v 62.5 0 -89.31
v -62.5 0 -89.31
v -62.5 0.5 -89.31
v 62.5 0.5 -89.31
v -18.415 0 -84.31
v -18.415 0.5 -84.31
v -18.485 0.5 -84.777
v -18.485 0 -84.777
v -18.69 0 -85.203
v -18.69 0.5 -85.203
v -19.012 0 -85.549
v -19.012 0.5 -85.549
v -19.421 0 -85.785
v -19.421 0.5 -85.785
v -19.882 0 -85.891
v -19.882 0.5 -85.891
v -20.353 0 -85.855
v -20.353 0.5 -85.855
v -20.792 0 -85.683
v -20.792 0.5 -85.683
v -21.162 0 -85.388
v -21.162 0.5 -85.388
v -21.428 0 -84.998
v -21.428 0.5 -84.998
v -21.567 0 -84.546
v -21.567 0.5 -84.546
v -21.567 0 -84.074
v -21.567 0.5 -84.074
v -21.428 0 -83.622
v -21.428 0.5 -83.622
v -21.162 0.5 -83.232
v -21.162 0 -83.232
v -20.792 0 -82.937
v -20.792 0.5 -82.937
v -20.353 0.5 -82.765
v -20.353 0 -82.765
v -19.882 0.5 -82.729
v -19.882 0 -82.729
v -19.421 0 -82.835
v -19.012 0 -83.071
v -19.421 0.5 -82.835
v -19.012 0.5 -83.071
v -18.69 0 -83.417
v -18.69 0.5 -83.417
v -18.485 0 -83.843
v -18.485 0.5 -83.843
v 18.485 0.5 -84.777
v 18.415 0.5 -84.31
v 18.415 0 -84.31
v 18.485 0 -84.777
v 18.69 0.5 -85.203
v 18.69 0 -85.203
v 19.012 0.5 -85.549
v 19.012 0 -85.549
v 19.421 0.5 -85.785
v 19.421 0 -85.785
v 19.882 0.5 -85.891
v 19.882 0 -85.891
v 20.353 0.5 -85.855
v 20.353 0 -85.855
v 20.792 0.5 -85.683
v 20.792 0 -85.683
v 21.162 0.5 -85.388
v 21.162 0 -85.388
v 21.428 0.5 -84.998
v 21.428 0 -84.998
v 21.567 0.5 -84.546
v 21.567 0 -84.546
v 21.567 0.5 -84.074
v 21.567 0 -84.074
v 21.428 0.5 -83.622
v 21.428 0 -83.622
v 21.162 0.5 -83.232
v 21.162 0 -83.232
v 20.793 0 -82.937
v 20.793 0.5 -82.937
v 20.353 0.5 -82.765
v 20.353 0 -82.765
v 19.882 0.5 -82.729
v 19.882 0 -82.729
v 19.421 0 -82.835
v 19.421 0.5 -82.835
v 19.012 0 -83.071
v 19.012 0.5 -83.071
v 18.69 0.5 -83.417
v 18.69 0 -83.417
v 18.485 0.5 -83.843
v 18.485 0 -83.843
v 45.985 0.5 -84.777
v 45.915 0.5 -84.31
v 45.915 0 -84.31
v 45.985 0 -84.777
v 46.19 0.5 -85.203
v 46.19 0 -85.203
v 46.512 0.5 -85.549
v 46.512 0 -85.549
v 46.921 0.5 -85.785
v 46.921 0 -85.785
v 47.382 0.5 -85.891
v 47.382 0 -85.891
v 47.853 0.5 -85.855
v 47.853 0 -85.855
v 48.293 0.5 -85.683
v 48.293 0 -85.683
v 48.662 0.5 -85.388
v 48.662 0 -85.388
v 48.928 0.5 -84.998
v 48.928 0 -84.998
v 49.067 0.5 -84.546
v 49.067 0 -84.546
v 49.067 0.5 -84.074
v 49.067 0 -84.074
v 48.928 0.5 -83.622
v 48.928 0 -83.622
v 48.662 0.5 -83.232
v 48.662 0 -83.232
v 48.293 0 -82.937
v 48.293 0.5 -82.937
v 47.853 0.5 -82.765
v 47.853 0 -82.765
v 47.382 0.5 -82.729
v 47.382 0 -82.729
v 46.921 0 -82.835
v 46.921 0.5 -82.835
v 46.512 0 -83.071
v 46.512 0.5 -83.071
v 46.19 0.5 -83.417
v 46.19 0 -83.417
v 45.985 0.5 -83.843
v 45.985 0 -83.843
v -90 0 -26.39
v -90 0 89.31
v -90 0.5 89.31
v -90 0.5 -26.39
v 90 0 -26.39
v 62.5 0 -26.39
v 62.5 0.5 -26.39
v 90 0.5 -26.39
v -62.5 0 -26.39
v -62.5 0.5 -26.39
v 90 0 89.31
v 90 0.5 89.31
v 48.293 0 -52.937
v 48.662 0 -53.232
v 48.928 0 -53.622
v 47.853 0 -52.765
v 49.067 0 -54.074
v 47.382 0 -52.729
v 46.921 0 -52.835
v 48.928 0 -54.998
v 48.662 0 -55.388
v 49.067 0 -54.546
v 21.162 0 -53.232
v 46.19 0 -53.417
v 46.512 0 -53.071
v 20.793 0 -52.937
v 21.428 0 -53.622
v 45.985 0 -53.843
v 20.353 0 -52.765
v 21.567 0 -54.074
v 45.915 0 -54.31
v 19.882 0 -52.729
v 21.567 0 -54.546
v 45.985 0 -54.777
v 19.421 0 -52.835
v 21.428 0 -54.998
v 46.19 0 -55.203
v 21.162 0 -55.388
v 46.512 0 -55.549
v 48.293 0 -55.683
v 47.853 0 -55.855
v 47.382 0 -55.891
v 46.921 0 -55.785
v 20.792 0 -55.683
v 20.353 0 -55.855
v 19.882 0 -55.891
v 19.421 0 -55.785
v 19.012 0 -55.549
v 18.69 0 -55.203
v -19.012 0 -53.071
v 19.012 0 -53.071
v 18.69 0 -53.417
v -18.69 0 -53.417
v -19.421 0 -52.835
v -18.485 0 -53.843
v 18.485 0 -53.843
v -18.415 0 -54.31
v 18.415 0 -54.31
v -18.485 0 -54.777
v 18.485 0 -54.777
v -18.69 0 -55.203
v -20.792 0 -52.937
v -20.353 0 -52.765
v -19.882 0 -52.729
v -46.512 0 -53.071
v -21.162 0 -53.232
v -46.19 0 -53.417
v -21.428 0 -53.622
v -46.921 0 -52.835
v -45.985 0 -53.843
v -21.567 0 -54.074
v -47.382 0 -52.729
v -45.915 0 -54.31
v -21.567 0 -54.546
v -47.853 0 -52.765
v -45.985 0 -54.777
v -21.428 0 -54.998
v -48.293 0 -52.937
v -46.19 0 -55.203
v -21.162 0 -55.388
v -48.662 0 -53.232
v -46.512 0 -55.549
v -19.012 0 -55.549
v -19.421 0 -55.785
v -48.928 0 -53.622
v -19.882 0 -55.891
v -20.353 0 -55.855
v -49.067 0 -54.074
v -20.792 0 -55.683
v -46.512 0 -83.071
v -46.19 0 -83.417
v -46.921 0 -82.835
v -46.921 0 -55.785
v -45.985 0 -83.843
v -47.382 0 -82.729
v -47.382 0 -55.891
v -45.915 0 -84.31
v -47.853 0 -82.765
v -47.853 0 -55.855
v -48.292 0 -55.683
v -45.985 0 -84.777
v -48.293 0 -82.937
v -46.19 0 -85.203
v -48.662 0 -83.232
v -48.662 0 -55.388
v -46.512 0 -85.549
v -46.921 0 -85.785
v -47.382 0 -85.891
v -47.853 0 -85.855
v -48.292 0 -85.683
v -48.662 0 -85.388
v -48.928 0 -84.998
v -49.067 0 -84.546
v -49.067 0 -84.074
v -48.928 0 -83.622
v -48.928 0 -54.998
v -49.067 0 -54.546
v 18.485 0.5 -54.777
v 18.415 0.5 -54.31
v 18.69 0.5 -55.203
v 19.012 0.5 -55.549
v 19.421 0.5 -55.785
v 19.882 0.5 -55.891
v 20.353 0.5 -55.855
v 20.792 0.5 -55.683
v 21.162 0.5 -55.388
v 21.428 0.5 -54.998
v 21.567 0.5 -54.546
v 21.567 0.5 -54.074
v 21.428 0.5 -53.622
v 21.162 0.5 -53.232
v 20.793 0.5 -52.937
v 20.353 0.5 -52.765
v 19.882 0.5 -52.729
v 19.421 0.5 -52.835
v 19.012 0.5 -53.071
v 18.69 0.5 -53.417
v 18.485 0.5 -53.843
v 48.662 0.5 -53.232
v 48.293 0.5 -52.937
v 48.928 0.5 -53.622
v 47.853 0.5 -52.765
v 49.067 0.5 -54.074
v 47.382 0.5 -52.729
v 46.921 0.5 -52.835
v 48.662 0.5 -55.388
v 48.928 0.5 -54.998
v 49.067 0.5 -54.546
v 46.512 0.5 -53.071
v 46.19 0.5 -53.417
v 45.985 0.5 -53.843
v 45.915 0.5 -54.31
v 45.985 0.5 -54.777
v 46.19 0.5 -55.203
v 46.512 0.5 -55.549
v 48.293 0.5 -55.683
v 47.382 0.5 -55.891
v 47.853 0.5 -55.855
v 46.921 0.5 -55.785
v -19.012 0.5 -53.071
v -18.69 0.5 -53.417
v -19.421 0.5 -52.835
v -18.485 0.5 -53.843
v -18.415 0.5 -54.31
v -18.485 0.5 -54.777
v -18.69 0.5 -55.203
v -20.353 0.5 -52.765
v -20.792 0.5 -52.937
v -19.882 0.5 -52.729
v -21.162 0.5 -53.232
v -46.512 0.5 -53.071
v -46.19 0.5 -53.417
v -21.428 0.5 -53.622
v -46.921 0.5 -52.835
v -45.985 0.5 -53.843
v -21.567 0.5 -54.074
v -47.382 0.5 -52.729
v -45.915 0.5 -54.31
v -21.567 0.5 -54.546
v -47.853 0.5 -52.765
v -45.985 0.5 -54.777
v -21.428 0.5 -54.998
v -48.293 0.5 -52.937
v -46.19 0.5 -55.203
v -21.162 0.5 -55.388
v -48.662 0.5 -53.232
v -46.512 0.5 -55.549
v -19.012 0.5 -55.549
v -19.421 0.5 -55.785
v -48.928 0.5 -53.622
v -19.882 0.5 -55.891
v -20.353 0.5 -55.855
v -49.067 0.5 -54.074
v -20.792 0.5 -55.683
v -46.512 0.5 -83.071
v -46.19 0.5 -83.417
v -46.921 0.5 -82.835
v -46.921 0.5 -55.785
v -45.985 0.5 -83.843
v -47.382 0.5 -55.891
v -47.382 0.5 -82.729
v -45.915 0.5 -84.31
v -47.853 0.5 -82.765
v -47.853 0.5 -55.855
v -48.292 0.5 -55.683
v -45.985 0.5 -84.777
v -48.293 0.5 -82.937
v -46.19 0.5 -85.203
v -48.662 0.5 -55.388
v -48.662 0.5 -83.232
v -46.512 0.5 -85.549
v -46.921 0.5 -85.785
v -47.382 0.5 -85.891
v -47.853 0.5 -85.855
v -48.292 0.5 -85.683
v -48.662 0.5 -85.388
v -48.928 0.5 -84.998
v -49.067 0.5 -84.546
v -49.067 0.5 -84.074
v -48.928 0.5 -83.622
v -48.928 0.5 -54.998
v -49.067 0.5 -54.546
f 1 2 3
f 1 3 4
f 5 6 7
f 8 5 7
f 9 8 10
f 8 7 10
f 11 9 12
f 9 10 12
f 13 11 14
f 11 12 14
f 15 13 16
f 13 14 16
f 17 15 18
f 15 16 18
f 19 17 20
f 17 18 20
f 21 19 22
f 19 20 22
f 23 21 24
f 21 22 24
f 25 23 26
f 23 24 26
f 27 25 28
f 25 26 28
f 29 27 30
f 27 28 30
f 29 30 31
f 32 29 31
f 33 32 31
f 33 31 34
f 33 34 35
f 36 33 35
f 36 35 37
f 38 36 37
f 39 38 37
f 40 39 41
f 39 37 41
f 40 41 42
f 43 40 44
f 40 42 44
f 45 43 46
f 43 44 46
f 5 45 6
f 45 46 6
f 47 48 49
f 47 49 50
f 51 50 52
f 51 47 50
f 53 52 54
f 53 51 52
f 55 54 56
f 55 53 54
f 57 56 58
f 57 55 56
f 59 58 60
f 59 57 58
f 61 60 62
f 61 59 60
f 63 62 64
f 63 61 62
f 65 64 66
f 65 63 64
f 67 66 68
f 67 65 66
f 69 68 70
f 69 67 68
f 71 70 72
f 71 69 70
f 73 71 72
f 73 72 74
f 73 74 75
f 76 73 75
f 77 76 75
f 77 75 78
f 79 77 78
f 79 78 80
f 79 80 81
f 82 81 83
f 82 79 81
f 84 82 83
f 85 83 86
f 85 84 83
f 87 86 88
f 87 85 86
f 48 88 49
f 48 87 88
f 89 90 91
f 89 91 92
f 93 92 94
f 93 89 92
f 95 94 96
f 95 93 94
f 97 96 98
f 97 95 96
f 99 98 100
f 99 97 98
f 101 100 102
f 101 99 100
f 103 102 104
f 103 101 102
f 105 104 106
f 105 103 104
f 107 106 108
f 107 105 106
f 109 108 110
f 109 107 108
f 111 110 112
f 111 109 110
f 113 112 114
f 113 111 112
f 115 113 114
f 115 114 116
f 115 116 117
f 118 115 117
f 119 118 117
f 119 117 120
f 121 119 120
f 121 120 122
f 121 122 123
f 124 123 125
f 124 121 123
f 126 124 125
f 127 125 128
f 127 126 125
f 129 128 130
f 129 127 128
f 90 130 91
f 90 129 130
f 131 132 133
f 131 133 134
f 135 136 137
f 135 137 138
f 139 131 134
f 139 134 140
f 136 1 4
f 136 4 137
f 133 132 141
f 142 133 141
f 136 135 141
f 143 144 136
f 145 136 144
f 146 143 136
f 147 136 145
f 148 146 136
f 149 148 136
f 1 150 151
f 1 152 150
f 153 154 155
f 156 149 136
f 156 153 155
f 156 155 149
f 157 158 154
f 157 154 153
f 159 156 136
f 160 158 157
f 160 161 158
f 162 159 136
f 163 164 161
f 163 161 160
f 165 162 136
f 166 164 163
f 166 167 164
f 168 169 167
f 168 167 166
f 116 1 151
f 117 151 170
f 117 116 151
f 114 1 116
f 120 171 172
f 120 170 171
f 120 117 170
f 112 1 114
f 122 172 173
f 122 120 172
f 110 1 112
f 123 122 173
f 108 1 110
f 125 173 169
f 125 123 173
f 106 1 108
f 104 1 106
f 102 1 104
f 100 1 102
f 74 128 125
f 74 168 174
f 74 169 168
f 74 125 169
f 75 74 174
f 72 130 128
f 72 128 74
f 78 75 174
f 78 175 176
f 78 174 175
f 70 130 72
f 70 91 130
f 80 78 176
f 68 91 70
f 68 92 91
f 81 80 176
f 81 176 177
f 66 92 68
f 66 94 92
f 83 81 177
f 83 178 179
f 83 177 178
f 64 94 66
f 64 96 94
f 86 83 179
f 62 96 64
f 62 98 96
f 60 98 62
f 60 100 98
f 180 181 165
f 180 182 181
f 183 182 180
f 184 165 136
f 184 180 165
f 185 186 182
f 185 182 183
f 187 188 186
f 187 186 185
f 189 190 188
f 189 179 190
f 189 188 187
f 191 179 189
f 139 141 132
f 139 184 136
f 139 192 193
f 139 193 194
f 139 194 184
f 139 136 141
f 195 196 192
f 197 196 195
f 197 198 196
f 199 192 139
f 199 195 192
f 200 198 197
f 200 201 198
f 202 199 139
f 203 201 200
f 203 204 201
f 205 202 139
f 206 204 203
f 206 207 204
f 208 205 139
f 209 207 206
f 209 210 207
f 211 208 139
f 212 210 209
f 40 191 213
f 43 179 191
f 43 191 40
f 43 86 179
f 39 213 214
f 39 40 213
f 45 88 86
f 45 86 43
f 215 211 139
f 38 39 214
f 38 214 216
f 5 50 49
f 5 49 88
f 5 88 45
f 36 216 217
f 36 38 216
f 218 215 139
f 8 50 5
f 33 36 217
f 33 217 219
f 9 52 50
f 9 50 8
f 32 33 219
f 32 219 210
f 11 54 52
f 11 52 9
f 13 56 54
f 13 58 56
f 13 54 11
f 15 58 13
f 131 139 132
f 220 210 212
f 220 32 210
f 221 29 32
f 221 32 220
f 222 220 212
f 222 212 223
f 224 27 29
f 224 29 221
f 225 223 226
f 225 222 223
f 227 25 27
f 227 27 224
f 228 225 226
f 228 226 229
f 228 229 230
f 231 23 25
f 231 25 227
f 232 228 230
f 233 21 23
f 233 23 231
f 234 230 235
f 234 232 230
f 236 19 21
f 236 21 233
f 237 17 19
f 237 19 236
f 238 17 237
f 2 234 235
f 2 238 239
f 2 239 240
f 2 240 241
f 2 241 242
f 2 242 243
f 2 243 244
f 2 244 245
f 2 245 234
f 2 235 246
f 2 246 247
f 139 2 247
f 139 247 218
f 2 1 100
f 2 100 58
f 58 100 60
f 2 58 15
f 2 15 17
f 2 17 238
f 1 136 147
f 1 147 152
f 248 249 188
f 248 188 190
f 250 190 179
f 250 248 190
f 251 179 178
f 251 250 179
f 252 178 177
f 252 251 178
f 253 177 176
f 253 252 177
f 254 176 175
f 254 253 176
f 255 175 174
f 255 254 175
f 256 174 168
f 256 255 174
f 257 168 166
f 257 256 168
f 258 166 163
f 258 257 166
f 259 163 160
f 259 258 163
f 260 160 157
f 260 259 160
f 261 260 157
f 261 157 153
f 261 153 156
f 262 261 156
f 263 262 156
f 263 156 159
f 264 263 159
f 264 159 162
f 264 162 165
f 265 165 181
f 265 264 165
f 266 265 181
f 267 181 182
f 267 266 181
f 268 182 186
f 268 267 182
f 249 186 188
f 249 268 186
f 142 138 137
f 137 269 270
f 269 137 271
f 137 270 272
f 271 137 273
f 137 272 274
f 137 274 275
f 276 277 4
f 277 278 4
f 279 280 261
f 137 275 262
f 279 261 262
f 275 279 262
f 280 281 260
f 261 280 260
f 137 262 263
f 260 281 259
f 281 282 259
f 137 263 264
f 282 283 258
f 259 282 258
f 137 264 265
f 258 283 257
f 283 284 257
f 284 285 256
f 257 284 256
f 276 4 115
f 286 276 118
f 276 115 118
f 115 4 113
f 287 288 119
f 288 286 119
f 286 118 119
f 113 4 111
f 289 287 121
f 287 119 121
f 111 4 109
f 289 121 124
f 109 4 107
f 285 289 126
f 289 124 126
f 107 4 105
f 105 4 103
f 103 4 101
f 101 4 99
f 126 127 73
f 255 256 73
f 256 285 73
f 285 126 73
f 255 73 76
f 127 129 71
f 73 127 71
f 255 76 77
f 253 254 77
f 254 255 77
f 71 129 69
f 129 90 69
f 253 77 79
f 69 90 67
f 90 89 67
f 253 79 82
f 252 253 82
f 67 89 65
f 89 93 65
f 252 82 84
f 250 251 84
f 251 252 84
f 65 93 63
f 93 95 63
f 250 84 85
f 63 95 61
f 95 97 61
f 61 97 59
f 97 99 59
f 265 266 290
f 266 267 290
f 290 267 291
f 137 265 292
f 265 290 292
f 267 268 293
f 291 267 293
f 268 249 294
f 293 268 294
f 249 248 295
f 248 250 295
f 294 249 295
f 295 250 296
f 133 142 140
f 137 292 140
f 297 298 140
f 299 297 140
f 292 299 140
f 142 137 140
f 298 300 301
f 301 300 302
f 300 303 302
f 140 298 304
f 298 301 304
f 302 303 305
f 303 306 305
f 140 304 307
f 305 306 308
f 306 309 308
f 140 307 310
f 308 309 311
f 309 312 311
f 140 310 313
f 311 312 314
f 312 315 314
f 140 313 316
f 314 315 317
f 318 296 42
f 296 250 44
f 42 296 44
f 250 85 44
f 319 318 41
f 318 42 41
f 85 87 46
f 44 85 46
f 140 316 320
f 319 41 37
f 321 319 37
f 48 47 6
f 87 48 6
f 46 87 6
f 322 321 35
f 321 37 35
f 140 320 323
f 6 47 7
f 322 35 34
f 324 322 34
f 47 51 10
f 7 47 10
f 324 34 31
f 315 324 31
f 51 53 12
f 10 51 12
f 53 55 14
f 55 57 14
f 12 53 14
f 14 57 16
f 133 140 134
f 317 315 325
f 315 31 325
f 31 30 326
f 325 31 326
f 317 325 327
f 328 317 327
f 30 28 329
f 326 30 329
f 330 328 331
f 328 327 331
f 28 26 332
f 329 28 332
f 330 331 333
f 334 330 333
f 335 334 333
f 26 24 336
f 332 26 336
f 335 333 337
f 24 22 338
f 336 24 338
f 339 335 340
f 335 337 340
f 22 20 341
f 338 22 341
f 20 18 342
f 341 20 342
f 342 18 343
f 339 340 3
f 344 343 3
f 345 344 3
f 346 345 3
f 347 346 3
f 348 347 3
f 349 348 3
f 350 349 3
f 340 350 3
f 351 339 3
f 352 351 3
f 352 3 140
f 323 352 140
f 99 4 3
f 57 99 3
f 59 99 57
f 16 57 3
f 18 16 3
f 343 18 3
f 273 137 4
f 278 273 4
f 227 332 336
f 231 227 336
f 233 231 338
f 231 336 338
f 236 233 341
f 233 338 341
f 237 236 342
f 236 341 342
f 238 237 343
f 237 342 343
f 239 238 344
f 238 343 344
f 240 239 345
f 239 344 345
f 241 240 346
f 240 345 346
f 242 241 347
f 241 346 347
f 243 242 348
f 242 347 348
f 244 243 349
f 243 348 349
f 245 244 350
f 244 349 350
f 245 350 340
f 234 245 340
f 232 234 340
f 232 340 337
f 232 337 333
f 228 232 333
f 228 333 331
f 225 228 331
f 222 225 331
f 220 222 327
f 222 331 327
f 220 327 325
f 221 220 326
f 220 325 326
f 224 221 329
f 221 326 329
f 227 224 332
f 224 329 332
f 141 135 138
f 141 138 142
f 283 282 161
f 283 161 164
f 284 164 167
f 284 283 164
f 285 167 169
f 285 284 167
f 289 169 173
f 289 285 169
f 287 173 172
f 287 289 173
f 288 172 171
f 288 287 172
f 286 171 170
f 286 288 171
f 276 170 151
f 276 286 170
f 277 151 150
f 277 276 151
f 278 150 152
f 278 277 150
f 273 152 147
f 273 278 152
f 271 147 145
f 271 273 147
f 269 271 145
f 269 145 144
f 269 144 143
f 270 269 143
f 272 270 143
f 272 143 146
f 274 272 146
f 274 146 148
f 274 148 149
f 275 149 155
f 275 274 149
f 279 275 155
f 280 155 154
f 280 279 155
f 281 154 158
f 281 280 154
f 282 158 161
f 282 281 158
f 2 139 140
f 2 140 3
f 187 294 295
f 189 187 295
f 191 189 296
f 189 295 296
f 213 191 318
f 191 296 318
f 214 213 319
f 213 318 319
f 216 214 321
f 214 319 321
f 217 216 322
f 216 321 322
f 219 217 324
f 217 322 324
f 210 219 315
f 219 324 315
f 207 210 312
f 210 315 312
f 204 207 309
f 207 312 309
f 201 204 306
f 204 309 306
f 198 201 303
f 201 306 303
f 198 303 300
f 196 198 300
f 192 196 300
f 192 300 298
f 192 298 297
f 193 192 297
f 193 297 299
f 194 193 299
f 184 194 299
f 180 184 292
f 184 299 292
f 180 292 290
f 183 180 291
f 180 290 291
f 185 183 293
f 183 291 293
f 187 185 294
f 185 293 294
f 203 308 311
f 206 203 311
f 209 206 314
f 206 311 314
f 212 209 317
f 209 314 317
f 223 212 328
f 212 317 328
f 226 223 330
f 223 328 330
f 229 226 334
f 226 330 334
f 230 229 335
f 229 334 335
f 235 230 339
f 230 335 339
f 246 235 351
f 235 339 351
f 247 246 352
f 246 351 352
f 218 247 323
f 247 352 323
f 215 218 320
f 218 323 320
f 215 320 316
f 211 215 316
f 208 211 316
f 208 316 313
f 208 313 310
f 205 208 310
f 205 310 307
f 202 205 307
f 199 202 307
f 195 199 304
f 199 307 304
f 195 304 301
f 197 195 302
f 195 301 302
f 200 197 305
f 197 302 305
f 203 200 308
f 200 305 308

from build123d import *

# Parameters (mm, degrees)
SALIENTE_EXTRUIR1_DEPTH = 0.5
CORTAR_EXTRUIR1_REACH   = 182
CROQUIS5_R              = 1.585
CORTAR_EXTRUIR3_DEPTH   = 0.5
CORTAR_EXTRUIR4_REACH   = 2.5
CROQUIS6_R              = 1.585
CORTAR_EXTRUIR5_REACH   = 2.5
CROQUIS7_R              = 1.585
CROQUIS8_R              = 1.585
CORTAR_EXTRUIR6_DEPTH   = 0.5


with BuildPart() as part:
    # Croquis2 → Saliente-Extruir1 (new body)
    with BuildSketch(Plane(origin=(0, 0, 0), x_dir=(1, 0, 0), z_dir=(0, 1, 0))):
        Polygon((-90, 26.39), (-62.5, 26.39), (-62.5, 89.31), (62.5, 89.31), (62.5, 26.39), (90, 26.39), (90, -89.31), (-90, -89.31), align=None)
    saliente_extruir1 = extrude(amount=SALIENTE_EXTRUIR1_DEPTH)

    # Croquis3 → Cortar-Extruir1 (cut, up to next)
    with BuildSketch(Plane(origin=(90, 0, 0), x_dir=(0, 0, -1), z_dir=(1, 0, 0)), mode=Mode.PRIVATE) as cortar_extruir1_sk1:
        Polygon((-89.31, 0), (-87.93626129, 0.5), (-89.31, 0.5), align=None)
    cortar_extruir1_tool1 = extrude(cortar_extruir1_sk1.sketch, amount=-CORTAR_EXTRUIR1_REACH, mode=Mode.PRIVATE) & part.part
    add(cortar_extruir1_tool1.solids().sort_by_distance((90, 0.333333, 88.852087))[0], mode=Mode.SUBTRACT)

    # Croquis5 → Cortar-Extruir3 (cut)
    with BuildSketch(Plane(origin=(0, 0.5, 0), x_dir=(1, 0, 0), z_dir=(0, 1, 0))):
        with Locations((74, -24.974980583)):
            Circle(CROQUIS5_R)
    cortar_extruir3 = extrude(amount=-CORTAR_EXTRUIR3_DEPTH, mode=Mode.SUBTRACT)

    # Simetría1: Cortar-Extruir3 across plane
    add(cortar_extruir3.mirror(Plane(origin=(0, 0, 0), x_dir=(0, 0, 1), z_dir=(1, 0, 0))), mode=Mode.SUBTRACT)

    # Croquis6 → Cortar-Extruir4 (cut, up to next)
    with BuildSketch(Plane(origin=(0, 0.5, 0), x_dir=(1, 0, 0), z_dir=(0, 1, 0)), mode=Mode.PRIVATE) as cortar_extruir4_sk1:
        with Locations((-56.5, 35.81)):
            Circle(CROQUIS6_R)
    cortar_extruir4_tool1 = extrude(cortar_extruir4_sk1.sketch, amount=-CORTAR_EXTRUIR4_REACH, mode=Mode.PRIVATE) & part.part
    add(cortar_extruir4_tool1.solids().sort_by_distance((-56.5, 0.5, -35.81))[0], mode=Mode.SUBTRACT)
    # Croquis6 → Cortar-Extruir4 (cut, up to next)
    with BuildSketch(Plane(origin=(0, 0.5, 0), x_dir=(1, 0, 0), z_dir=(0, 1, 0)), mode=Mode.PRIVATE) as cortar_extruir4_sk2:
        with Locations((-15.5, 35.81)):
            Circle(CROQUIS6_R)
    cortar_extruir4_tool2 = extrude(cortar_extruir4_sk2.sketch, amount=-CORTAR_EXTRUIR4_REACH, mode=Mode.PRIVATE) & part.part
    add(cortar_extruir4_tool2.solids().sort_by_distance((-15.5, 0.5, -35.81))[0], mode=Mode.SUBTRACT)
    # Croquis6 → Cortar-Extruir4 (cut, up to next)
    with BuildSketch(Plane(origin=(0, 0.5, 0), x_dir=(1, 0, 0), z_dir=(0, 1, 0)), mode=Mode.PRIVATE) as cortar_extruir4_sk3:
        with Locations((-15.5, 84.31)):
            Circle(CROQUIS6_R)
    cortar_extruir4_tool3 = extrude(cortar_extruir4_sk3.sketch, amount=-CORTAR_EXTRUIR4_REACH, mode=Mode.PRIVATE) & part.part
    add(cortar_extruir4_tool3.solids().sort_by_distance((-15.5, 0.5, -84.31))[0], mode=Mode.SUBTRACT)
    # Croquis6 → Cortar-Extruir4 (cut, up to next)
    with BuildSketch(Plane(origin=(0, 0.5, 0), x_dir=(1, 0, 0), z_dir=(0, 1, 0)), mode=Mode.PRIVATE) as cortar_extruir4_sk4:
        with Locations((-56.5, 84.31)):
            Circle(CROQUIS6_R)
    cortar_extruir4_tool4 = extrude(cortar_extruir4_sk4.sketch, amount=-CORTAR_EXTRUIR4_REACH, mode=Mode.PRIVATE) & part.part
    add(cortar_extruir4_tool4.solids().sort_by_distance((-56.5, 0.5, -84.31))[0], mode=Mode.SUBTRACT)

    # Croquis7 → Cortar-Extruir5 (cut, up to next)
    with BuildSketch(Plane(origin=(0, 0.5, 0), x_dir=(1, 0, 0), z_dir=(0, 1, 0)), mode=Mode.PRIVATE) as cortar_extruir5_sk1:
        with Locations((56.5, 35.81)):
            Circle(CROQUIS7_R)
    cortar_extruir5_tool1 = extrude(cortar_extruir5_sk1.sketch, amount=-CORTAR_EXTRUIR5_REACH, mode=Mode.PRIVATE) & part.part
    add(cortar_extruir5_tool1.solids().sort_by_distance((56.5, 0.5, -35.81))[0], mode=Mode.SUBTRACT)
    # Croquis7 → Cortar-Extruir5 (cut, up to next)
    with BuildSketch(Plane(origin=(0, 0.5, 0), x_dir=(1, 0, 0), z_dir=(0, 1, 0)), mode=Mode.PRIVATE) as cortar_extruir5_sk2:
        with Locations((15.5, 35.81)):
            Circle(CROQUIS7_R)
    cortar_extruir5_tool2 = extrude(cortar_extruir5_sk2.sketch, amount=-CORTAR_EXTRUIR5_REACH, mode=Mode.PRIVATE) & part.part
    add(cortar_extruir5_tool2.solids().sort_by_distance((15.5, 0.5, -35.81))[0], mode=Mode.SUBTRACT)
    # Croquis7 → Cortar-Extruir5 (cut, up to next)
    with BuildSketch(Plane(origin=(0, 0.5, 0), x_dir=(1, 0, 0), z_dir=(0, 1, 0)), mode=Mode.PRIVATE) as cortar_extruir5_sk3:
        with Locations((15.5, 84.31)):
            Circle(CROQUIS7_R)
    cortar_extruir5_tool3 = extrude(cortar_extruir5_sk3.sketch, amount=-CORTAR_EXTRUIR5_REACH, mode=Mode.PRIVATE) & part.part
    add(cortar_extruir5_tool3.solids().sort_by_distance((15.5, 0.5, -84.31))[0], mode=Mode.SUBTRACT)
    # Croquis7 → Cortar-Extruir5 (cut, up to next)
    with BuildSketch(Plane(origin=(0, 0.5, 0), x_dir=(1, 0, 0), z_dir=(0, 1, 0)), mode=Mode.PRIVATE) as cortar_extruir5_sk4:
        with Locations((56.5, 84.31)):
            Circle(CROQUIS7_R)
    cortar_extruir5_tool4 = extrude(cortar_extruir5_sk4.sketch, amount=-CORTAR_EXTRUIR5_REACH, mode=Mode.PRIVATE) & part.part
    add(cortar_extruir5_tool4.solids().sort_by_distance((56.5, 0.5, -84.31))[0], mode=Mode.SUBTRACT)

    # Simetría3: Saliente-Extruir1 across plane
    add(saliente_extruir1.mirror(Plane(origin=(0, 0, 0), x_dir=(0, 0, 1), z_dir=(1, 0, 0))))

    # Croquis8 → Cortar-Extruir6 (cut)
    with BuildSketch(Plane(origin=(0, 0.5, 0), x_dir=(1, 0, 0), z_dir=(0, 1, 0))):
        with Locations((-20, 54.31)):
            Circle(CROQUIS8_R)
        with Locations((-47.5, 54.31)):
            Circle(CROQUIS8_R)
        with Locations((-47.5, 84.31)):
            Circle(CROQUIS8_R)
        with Locations((-20, 84.31)):
            Circle(CROQUIS8_R)
    cortar_extruir6 = extrude(amount=-CORTAR_EXTRUIR6_DEPTH, mode=Mode.SUBTRACT)

    # Simetría4: Cortar-Extruir6 across plane
    add(cortar_extruir6.mirror(Plane(origin=(0, 0, 0), x_dir=(0, 0, 1), z_dir=(1, 0, 0))), mode=Mode.SUBTRACT)


solid = part.part
